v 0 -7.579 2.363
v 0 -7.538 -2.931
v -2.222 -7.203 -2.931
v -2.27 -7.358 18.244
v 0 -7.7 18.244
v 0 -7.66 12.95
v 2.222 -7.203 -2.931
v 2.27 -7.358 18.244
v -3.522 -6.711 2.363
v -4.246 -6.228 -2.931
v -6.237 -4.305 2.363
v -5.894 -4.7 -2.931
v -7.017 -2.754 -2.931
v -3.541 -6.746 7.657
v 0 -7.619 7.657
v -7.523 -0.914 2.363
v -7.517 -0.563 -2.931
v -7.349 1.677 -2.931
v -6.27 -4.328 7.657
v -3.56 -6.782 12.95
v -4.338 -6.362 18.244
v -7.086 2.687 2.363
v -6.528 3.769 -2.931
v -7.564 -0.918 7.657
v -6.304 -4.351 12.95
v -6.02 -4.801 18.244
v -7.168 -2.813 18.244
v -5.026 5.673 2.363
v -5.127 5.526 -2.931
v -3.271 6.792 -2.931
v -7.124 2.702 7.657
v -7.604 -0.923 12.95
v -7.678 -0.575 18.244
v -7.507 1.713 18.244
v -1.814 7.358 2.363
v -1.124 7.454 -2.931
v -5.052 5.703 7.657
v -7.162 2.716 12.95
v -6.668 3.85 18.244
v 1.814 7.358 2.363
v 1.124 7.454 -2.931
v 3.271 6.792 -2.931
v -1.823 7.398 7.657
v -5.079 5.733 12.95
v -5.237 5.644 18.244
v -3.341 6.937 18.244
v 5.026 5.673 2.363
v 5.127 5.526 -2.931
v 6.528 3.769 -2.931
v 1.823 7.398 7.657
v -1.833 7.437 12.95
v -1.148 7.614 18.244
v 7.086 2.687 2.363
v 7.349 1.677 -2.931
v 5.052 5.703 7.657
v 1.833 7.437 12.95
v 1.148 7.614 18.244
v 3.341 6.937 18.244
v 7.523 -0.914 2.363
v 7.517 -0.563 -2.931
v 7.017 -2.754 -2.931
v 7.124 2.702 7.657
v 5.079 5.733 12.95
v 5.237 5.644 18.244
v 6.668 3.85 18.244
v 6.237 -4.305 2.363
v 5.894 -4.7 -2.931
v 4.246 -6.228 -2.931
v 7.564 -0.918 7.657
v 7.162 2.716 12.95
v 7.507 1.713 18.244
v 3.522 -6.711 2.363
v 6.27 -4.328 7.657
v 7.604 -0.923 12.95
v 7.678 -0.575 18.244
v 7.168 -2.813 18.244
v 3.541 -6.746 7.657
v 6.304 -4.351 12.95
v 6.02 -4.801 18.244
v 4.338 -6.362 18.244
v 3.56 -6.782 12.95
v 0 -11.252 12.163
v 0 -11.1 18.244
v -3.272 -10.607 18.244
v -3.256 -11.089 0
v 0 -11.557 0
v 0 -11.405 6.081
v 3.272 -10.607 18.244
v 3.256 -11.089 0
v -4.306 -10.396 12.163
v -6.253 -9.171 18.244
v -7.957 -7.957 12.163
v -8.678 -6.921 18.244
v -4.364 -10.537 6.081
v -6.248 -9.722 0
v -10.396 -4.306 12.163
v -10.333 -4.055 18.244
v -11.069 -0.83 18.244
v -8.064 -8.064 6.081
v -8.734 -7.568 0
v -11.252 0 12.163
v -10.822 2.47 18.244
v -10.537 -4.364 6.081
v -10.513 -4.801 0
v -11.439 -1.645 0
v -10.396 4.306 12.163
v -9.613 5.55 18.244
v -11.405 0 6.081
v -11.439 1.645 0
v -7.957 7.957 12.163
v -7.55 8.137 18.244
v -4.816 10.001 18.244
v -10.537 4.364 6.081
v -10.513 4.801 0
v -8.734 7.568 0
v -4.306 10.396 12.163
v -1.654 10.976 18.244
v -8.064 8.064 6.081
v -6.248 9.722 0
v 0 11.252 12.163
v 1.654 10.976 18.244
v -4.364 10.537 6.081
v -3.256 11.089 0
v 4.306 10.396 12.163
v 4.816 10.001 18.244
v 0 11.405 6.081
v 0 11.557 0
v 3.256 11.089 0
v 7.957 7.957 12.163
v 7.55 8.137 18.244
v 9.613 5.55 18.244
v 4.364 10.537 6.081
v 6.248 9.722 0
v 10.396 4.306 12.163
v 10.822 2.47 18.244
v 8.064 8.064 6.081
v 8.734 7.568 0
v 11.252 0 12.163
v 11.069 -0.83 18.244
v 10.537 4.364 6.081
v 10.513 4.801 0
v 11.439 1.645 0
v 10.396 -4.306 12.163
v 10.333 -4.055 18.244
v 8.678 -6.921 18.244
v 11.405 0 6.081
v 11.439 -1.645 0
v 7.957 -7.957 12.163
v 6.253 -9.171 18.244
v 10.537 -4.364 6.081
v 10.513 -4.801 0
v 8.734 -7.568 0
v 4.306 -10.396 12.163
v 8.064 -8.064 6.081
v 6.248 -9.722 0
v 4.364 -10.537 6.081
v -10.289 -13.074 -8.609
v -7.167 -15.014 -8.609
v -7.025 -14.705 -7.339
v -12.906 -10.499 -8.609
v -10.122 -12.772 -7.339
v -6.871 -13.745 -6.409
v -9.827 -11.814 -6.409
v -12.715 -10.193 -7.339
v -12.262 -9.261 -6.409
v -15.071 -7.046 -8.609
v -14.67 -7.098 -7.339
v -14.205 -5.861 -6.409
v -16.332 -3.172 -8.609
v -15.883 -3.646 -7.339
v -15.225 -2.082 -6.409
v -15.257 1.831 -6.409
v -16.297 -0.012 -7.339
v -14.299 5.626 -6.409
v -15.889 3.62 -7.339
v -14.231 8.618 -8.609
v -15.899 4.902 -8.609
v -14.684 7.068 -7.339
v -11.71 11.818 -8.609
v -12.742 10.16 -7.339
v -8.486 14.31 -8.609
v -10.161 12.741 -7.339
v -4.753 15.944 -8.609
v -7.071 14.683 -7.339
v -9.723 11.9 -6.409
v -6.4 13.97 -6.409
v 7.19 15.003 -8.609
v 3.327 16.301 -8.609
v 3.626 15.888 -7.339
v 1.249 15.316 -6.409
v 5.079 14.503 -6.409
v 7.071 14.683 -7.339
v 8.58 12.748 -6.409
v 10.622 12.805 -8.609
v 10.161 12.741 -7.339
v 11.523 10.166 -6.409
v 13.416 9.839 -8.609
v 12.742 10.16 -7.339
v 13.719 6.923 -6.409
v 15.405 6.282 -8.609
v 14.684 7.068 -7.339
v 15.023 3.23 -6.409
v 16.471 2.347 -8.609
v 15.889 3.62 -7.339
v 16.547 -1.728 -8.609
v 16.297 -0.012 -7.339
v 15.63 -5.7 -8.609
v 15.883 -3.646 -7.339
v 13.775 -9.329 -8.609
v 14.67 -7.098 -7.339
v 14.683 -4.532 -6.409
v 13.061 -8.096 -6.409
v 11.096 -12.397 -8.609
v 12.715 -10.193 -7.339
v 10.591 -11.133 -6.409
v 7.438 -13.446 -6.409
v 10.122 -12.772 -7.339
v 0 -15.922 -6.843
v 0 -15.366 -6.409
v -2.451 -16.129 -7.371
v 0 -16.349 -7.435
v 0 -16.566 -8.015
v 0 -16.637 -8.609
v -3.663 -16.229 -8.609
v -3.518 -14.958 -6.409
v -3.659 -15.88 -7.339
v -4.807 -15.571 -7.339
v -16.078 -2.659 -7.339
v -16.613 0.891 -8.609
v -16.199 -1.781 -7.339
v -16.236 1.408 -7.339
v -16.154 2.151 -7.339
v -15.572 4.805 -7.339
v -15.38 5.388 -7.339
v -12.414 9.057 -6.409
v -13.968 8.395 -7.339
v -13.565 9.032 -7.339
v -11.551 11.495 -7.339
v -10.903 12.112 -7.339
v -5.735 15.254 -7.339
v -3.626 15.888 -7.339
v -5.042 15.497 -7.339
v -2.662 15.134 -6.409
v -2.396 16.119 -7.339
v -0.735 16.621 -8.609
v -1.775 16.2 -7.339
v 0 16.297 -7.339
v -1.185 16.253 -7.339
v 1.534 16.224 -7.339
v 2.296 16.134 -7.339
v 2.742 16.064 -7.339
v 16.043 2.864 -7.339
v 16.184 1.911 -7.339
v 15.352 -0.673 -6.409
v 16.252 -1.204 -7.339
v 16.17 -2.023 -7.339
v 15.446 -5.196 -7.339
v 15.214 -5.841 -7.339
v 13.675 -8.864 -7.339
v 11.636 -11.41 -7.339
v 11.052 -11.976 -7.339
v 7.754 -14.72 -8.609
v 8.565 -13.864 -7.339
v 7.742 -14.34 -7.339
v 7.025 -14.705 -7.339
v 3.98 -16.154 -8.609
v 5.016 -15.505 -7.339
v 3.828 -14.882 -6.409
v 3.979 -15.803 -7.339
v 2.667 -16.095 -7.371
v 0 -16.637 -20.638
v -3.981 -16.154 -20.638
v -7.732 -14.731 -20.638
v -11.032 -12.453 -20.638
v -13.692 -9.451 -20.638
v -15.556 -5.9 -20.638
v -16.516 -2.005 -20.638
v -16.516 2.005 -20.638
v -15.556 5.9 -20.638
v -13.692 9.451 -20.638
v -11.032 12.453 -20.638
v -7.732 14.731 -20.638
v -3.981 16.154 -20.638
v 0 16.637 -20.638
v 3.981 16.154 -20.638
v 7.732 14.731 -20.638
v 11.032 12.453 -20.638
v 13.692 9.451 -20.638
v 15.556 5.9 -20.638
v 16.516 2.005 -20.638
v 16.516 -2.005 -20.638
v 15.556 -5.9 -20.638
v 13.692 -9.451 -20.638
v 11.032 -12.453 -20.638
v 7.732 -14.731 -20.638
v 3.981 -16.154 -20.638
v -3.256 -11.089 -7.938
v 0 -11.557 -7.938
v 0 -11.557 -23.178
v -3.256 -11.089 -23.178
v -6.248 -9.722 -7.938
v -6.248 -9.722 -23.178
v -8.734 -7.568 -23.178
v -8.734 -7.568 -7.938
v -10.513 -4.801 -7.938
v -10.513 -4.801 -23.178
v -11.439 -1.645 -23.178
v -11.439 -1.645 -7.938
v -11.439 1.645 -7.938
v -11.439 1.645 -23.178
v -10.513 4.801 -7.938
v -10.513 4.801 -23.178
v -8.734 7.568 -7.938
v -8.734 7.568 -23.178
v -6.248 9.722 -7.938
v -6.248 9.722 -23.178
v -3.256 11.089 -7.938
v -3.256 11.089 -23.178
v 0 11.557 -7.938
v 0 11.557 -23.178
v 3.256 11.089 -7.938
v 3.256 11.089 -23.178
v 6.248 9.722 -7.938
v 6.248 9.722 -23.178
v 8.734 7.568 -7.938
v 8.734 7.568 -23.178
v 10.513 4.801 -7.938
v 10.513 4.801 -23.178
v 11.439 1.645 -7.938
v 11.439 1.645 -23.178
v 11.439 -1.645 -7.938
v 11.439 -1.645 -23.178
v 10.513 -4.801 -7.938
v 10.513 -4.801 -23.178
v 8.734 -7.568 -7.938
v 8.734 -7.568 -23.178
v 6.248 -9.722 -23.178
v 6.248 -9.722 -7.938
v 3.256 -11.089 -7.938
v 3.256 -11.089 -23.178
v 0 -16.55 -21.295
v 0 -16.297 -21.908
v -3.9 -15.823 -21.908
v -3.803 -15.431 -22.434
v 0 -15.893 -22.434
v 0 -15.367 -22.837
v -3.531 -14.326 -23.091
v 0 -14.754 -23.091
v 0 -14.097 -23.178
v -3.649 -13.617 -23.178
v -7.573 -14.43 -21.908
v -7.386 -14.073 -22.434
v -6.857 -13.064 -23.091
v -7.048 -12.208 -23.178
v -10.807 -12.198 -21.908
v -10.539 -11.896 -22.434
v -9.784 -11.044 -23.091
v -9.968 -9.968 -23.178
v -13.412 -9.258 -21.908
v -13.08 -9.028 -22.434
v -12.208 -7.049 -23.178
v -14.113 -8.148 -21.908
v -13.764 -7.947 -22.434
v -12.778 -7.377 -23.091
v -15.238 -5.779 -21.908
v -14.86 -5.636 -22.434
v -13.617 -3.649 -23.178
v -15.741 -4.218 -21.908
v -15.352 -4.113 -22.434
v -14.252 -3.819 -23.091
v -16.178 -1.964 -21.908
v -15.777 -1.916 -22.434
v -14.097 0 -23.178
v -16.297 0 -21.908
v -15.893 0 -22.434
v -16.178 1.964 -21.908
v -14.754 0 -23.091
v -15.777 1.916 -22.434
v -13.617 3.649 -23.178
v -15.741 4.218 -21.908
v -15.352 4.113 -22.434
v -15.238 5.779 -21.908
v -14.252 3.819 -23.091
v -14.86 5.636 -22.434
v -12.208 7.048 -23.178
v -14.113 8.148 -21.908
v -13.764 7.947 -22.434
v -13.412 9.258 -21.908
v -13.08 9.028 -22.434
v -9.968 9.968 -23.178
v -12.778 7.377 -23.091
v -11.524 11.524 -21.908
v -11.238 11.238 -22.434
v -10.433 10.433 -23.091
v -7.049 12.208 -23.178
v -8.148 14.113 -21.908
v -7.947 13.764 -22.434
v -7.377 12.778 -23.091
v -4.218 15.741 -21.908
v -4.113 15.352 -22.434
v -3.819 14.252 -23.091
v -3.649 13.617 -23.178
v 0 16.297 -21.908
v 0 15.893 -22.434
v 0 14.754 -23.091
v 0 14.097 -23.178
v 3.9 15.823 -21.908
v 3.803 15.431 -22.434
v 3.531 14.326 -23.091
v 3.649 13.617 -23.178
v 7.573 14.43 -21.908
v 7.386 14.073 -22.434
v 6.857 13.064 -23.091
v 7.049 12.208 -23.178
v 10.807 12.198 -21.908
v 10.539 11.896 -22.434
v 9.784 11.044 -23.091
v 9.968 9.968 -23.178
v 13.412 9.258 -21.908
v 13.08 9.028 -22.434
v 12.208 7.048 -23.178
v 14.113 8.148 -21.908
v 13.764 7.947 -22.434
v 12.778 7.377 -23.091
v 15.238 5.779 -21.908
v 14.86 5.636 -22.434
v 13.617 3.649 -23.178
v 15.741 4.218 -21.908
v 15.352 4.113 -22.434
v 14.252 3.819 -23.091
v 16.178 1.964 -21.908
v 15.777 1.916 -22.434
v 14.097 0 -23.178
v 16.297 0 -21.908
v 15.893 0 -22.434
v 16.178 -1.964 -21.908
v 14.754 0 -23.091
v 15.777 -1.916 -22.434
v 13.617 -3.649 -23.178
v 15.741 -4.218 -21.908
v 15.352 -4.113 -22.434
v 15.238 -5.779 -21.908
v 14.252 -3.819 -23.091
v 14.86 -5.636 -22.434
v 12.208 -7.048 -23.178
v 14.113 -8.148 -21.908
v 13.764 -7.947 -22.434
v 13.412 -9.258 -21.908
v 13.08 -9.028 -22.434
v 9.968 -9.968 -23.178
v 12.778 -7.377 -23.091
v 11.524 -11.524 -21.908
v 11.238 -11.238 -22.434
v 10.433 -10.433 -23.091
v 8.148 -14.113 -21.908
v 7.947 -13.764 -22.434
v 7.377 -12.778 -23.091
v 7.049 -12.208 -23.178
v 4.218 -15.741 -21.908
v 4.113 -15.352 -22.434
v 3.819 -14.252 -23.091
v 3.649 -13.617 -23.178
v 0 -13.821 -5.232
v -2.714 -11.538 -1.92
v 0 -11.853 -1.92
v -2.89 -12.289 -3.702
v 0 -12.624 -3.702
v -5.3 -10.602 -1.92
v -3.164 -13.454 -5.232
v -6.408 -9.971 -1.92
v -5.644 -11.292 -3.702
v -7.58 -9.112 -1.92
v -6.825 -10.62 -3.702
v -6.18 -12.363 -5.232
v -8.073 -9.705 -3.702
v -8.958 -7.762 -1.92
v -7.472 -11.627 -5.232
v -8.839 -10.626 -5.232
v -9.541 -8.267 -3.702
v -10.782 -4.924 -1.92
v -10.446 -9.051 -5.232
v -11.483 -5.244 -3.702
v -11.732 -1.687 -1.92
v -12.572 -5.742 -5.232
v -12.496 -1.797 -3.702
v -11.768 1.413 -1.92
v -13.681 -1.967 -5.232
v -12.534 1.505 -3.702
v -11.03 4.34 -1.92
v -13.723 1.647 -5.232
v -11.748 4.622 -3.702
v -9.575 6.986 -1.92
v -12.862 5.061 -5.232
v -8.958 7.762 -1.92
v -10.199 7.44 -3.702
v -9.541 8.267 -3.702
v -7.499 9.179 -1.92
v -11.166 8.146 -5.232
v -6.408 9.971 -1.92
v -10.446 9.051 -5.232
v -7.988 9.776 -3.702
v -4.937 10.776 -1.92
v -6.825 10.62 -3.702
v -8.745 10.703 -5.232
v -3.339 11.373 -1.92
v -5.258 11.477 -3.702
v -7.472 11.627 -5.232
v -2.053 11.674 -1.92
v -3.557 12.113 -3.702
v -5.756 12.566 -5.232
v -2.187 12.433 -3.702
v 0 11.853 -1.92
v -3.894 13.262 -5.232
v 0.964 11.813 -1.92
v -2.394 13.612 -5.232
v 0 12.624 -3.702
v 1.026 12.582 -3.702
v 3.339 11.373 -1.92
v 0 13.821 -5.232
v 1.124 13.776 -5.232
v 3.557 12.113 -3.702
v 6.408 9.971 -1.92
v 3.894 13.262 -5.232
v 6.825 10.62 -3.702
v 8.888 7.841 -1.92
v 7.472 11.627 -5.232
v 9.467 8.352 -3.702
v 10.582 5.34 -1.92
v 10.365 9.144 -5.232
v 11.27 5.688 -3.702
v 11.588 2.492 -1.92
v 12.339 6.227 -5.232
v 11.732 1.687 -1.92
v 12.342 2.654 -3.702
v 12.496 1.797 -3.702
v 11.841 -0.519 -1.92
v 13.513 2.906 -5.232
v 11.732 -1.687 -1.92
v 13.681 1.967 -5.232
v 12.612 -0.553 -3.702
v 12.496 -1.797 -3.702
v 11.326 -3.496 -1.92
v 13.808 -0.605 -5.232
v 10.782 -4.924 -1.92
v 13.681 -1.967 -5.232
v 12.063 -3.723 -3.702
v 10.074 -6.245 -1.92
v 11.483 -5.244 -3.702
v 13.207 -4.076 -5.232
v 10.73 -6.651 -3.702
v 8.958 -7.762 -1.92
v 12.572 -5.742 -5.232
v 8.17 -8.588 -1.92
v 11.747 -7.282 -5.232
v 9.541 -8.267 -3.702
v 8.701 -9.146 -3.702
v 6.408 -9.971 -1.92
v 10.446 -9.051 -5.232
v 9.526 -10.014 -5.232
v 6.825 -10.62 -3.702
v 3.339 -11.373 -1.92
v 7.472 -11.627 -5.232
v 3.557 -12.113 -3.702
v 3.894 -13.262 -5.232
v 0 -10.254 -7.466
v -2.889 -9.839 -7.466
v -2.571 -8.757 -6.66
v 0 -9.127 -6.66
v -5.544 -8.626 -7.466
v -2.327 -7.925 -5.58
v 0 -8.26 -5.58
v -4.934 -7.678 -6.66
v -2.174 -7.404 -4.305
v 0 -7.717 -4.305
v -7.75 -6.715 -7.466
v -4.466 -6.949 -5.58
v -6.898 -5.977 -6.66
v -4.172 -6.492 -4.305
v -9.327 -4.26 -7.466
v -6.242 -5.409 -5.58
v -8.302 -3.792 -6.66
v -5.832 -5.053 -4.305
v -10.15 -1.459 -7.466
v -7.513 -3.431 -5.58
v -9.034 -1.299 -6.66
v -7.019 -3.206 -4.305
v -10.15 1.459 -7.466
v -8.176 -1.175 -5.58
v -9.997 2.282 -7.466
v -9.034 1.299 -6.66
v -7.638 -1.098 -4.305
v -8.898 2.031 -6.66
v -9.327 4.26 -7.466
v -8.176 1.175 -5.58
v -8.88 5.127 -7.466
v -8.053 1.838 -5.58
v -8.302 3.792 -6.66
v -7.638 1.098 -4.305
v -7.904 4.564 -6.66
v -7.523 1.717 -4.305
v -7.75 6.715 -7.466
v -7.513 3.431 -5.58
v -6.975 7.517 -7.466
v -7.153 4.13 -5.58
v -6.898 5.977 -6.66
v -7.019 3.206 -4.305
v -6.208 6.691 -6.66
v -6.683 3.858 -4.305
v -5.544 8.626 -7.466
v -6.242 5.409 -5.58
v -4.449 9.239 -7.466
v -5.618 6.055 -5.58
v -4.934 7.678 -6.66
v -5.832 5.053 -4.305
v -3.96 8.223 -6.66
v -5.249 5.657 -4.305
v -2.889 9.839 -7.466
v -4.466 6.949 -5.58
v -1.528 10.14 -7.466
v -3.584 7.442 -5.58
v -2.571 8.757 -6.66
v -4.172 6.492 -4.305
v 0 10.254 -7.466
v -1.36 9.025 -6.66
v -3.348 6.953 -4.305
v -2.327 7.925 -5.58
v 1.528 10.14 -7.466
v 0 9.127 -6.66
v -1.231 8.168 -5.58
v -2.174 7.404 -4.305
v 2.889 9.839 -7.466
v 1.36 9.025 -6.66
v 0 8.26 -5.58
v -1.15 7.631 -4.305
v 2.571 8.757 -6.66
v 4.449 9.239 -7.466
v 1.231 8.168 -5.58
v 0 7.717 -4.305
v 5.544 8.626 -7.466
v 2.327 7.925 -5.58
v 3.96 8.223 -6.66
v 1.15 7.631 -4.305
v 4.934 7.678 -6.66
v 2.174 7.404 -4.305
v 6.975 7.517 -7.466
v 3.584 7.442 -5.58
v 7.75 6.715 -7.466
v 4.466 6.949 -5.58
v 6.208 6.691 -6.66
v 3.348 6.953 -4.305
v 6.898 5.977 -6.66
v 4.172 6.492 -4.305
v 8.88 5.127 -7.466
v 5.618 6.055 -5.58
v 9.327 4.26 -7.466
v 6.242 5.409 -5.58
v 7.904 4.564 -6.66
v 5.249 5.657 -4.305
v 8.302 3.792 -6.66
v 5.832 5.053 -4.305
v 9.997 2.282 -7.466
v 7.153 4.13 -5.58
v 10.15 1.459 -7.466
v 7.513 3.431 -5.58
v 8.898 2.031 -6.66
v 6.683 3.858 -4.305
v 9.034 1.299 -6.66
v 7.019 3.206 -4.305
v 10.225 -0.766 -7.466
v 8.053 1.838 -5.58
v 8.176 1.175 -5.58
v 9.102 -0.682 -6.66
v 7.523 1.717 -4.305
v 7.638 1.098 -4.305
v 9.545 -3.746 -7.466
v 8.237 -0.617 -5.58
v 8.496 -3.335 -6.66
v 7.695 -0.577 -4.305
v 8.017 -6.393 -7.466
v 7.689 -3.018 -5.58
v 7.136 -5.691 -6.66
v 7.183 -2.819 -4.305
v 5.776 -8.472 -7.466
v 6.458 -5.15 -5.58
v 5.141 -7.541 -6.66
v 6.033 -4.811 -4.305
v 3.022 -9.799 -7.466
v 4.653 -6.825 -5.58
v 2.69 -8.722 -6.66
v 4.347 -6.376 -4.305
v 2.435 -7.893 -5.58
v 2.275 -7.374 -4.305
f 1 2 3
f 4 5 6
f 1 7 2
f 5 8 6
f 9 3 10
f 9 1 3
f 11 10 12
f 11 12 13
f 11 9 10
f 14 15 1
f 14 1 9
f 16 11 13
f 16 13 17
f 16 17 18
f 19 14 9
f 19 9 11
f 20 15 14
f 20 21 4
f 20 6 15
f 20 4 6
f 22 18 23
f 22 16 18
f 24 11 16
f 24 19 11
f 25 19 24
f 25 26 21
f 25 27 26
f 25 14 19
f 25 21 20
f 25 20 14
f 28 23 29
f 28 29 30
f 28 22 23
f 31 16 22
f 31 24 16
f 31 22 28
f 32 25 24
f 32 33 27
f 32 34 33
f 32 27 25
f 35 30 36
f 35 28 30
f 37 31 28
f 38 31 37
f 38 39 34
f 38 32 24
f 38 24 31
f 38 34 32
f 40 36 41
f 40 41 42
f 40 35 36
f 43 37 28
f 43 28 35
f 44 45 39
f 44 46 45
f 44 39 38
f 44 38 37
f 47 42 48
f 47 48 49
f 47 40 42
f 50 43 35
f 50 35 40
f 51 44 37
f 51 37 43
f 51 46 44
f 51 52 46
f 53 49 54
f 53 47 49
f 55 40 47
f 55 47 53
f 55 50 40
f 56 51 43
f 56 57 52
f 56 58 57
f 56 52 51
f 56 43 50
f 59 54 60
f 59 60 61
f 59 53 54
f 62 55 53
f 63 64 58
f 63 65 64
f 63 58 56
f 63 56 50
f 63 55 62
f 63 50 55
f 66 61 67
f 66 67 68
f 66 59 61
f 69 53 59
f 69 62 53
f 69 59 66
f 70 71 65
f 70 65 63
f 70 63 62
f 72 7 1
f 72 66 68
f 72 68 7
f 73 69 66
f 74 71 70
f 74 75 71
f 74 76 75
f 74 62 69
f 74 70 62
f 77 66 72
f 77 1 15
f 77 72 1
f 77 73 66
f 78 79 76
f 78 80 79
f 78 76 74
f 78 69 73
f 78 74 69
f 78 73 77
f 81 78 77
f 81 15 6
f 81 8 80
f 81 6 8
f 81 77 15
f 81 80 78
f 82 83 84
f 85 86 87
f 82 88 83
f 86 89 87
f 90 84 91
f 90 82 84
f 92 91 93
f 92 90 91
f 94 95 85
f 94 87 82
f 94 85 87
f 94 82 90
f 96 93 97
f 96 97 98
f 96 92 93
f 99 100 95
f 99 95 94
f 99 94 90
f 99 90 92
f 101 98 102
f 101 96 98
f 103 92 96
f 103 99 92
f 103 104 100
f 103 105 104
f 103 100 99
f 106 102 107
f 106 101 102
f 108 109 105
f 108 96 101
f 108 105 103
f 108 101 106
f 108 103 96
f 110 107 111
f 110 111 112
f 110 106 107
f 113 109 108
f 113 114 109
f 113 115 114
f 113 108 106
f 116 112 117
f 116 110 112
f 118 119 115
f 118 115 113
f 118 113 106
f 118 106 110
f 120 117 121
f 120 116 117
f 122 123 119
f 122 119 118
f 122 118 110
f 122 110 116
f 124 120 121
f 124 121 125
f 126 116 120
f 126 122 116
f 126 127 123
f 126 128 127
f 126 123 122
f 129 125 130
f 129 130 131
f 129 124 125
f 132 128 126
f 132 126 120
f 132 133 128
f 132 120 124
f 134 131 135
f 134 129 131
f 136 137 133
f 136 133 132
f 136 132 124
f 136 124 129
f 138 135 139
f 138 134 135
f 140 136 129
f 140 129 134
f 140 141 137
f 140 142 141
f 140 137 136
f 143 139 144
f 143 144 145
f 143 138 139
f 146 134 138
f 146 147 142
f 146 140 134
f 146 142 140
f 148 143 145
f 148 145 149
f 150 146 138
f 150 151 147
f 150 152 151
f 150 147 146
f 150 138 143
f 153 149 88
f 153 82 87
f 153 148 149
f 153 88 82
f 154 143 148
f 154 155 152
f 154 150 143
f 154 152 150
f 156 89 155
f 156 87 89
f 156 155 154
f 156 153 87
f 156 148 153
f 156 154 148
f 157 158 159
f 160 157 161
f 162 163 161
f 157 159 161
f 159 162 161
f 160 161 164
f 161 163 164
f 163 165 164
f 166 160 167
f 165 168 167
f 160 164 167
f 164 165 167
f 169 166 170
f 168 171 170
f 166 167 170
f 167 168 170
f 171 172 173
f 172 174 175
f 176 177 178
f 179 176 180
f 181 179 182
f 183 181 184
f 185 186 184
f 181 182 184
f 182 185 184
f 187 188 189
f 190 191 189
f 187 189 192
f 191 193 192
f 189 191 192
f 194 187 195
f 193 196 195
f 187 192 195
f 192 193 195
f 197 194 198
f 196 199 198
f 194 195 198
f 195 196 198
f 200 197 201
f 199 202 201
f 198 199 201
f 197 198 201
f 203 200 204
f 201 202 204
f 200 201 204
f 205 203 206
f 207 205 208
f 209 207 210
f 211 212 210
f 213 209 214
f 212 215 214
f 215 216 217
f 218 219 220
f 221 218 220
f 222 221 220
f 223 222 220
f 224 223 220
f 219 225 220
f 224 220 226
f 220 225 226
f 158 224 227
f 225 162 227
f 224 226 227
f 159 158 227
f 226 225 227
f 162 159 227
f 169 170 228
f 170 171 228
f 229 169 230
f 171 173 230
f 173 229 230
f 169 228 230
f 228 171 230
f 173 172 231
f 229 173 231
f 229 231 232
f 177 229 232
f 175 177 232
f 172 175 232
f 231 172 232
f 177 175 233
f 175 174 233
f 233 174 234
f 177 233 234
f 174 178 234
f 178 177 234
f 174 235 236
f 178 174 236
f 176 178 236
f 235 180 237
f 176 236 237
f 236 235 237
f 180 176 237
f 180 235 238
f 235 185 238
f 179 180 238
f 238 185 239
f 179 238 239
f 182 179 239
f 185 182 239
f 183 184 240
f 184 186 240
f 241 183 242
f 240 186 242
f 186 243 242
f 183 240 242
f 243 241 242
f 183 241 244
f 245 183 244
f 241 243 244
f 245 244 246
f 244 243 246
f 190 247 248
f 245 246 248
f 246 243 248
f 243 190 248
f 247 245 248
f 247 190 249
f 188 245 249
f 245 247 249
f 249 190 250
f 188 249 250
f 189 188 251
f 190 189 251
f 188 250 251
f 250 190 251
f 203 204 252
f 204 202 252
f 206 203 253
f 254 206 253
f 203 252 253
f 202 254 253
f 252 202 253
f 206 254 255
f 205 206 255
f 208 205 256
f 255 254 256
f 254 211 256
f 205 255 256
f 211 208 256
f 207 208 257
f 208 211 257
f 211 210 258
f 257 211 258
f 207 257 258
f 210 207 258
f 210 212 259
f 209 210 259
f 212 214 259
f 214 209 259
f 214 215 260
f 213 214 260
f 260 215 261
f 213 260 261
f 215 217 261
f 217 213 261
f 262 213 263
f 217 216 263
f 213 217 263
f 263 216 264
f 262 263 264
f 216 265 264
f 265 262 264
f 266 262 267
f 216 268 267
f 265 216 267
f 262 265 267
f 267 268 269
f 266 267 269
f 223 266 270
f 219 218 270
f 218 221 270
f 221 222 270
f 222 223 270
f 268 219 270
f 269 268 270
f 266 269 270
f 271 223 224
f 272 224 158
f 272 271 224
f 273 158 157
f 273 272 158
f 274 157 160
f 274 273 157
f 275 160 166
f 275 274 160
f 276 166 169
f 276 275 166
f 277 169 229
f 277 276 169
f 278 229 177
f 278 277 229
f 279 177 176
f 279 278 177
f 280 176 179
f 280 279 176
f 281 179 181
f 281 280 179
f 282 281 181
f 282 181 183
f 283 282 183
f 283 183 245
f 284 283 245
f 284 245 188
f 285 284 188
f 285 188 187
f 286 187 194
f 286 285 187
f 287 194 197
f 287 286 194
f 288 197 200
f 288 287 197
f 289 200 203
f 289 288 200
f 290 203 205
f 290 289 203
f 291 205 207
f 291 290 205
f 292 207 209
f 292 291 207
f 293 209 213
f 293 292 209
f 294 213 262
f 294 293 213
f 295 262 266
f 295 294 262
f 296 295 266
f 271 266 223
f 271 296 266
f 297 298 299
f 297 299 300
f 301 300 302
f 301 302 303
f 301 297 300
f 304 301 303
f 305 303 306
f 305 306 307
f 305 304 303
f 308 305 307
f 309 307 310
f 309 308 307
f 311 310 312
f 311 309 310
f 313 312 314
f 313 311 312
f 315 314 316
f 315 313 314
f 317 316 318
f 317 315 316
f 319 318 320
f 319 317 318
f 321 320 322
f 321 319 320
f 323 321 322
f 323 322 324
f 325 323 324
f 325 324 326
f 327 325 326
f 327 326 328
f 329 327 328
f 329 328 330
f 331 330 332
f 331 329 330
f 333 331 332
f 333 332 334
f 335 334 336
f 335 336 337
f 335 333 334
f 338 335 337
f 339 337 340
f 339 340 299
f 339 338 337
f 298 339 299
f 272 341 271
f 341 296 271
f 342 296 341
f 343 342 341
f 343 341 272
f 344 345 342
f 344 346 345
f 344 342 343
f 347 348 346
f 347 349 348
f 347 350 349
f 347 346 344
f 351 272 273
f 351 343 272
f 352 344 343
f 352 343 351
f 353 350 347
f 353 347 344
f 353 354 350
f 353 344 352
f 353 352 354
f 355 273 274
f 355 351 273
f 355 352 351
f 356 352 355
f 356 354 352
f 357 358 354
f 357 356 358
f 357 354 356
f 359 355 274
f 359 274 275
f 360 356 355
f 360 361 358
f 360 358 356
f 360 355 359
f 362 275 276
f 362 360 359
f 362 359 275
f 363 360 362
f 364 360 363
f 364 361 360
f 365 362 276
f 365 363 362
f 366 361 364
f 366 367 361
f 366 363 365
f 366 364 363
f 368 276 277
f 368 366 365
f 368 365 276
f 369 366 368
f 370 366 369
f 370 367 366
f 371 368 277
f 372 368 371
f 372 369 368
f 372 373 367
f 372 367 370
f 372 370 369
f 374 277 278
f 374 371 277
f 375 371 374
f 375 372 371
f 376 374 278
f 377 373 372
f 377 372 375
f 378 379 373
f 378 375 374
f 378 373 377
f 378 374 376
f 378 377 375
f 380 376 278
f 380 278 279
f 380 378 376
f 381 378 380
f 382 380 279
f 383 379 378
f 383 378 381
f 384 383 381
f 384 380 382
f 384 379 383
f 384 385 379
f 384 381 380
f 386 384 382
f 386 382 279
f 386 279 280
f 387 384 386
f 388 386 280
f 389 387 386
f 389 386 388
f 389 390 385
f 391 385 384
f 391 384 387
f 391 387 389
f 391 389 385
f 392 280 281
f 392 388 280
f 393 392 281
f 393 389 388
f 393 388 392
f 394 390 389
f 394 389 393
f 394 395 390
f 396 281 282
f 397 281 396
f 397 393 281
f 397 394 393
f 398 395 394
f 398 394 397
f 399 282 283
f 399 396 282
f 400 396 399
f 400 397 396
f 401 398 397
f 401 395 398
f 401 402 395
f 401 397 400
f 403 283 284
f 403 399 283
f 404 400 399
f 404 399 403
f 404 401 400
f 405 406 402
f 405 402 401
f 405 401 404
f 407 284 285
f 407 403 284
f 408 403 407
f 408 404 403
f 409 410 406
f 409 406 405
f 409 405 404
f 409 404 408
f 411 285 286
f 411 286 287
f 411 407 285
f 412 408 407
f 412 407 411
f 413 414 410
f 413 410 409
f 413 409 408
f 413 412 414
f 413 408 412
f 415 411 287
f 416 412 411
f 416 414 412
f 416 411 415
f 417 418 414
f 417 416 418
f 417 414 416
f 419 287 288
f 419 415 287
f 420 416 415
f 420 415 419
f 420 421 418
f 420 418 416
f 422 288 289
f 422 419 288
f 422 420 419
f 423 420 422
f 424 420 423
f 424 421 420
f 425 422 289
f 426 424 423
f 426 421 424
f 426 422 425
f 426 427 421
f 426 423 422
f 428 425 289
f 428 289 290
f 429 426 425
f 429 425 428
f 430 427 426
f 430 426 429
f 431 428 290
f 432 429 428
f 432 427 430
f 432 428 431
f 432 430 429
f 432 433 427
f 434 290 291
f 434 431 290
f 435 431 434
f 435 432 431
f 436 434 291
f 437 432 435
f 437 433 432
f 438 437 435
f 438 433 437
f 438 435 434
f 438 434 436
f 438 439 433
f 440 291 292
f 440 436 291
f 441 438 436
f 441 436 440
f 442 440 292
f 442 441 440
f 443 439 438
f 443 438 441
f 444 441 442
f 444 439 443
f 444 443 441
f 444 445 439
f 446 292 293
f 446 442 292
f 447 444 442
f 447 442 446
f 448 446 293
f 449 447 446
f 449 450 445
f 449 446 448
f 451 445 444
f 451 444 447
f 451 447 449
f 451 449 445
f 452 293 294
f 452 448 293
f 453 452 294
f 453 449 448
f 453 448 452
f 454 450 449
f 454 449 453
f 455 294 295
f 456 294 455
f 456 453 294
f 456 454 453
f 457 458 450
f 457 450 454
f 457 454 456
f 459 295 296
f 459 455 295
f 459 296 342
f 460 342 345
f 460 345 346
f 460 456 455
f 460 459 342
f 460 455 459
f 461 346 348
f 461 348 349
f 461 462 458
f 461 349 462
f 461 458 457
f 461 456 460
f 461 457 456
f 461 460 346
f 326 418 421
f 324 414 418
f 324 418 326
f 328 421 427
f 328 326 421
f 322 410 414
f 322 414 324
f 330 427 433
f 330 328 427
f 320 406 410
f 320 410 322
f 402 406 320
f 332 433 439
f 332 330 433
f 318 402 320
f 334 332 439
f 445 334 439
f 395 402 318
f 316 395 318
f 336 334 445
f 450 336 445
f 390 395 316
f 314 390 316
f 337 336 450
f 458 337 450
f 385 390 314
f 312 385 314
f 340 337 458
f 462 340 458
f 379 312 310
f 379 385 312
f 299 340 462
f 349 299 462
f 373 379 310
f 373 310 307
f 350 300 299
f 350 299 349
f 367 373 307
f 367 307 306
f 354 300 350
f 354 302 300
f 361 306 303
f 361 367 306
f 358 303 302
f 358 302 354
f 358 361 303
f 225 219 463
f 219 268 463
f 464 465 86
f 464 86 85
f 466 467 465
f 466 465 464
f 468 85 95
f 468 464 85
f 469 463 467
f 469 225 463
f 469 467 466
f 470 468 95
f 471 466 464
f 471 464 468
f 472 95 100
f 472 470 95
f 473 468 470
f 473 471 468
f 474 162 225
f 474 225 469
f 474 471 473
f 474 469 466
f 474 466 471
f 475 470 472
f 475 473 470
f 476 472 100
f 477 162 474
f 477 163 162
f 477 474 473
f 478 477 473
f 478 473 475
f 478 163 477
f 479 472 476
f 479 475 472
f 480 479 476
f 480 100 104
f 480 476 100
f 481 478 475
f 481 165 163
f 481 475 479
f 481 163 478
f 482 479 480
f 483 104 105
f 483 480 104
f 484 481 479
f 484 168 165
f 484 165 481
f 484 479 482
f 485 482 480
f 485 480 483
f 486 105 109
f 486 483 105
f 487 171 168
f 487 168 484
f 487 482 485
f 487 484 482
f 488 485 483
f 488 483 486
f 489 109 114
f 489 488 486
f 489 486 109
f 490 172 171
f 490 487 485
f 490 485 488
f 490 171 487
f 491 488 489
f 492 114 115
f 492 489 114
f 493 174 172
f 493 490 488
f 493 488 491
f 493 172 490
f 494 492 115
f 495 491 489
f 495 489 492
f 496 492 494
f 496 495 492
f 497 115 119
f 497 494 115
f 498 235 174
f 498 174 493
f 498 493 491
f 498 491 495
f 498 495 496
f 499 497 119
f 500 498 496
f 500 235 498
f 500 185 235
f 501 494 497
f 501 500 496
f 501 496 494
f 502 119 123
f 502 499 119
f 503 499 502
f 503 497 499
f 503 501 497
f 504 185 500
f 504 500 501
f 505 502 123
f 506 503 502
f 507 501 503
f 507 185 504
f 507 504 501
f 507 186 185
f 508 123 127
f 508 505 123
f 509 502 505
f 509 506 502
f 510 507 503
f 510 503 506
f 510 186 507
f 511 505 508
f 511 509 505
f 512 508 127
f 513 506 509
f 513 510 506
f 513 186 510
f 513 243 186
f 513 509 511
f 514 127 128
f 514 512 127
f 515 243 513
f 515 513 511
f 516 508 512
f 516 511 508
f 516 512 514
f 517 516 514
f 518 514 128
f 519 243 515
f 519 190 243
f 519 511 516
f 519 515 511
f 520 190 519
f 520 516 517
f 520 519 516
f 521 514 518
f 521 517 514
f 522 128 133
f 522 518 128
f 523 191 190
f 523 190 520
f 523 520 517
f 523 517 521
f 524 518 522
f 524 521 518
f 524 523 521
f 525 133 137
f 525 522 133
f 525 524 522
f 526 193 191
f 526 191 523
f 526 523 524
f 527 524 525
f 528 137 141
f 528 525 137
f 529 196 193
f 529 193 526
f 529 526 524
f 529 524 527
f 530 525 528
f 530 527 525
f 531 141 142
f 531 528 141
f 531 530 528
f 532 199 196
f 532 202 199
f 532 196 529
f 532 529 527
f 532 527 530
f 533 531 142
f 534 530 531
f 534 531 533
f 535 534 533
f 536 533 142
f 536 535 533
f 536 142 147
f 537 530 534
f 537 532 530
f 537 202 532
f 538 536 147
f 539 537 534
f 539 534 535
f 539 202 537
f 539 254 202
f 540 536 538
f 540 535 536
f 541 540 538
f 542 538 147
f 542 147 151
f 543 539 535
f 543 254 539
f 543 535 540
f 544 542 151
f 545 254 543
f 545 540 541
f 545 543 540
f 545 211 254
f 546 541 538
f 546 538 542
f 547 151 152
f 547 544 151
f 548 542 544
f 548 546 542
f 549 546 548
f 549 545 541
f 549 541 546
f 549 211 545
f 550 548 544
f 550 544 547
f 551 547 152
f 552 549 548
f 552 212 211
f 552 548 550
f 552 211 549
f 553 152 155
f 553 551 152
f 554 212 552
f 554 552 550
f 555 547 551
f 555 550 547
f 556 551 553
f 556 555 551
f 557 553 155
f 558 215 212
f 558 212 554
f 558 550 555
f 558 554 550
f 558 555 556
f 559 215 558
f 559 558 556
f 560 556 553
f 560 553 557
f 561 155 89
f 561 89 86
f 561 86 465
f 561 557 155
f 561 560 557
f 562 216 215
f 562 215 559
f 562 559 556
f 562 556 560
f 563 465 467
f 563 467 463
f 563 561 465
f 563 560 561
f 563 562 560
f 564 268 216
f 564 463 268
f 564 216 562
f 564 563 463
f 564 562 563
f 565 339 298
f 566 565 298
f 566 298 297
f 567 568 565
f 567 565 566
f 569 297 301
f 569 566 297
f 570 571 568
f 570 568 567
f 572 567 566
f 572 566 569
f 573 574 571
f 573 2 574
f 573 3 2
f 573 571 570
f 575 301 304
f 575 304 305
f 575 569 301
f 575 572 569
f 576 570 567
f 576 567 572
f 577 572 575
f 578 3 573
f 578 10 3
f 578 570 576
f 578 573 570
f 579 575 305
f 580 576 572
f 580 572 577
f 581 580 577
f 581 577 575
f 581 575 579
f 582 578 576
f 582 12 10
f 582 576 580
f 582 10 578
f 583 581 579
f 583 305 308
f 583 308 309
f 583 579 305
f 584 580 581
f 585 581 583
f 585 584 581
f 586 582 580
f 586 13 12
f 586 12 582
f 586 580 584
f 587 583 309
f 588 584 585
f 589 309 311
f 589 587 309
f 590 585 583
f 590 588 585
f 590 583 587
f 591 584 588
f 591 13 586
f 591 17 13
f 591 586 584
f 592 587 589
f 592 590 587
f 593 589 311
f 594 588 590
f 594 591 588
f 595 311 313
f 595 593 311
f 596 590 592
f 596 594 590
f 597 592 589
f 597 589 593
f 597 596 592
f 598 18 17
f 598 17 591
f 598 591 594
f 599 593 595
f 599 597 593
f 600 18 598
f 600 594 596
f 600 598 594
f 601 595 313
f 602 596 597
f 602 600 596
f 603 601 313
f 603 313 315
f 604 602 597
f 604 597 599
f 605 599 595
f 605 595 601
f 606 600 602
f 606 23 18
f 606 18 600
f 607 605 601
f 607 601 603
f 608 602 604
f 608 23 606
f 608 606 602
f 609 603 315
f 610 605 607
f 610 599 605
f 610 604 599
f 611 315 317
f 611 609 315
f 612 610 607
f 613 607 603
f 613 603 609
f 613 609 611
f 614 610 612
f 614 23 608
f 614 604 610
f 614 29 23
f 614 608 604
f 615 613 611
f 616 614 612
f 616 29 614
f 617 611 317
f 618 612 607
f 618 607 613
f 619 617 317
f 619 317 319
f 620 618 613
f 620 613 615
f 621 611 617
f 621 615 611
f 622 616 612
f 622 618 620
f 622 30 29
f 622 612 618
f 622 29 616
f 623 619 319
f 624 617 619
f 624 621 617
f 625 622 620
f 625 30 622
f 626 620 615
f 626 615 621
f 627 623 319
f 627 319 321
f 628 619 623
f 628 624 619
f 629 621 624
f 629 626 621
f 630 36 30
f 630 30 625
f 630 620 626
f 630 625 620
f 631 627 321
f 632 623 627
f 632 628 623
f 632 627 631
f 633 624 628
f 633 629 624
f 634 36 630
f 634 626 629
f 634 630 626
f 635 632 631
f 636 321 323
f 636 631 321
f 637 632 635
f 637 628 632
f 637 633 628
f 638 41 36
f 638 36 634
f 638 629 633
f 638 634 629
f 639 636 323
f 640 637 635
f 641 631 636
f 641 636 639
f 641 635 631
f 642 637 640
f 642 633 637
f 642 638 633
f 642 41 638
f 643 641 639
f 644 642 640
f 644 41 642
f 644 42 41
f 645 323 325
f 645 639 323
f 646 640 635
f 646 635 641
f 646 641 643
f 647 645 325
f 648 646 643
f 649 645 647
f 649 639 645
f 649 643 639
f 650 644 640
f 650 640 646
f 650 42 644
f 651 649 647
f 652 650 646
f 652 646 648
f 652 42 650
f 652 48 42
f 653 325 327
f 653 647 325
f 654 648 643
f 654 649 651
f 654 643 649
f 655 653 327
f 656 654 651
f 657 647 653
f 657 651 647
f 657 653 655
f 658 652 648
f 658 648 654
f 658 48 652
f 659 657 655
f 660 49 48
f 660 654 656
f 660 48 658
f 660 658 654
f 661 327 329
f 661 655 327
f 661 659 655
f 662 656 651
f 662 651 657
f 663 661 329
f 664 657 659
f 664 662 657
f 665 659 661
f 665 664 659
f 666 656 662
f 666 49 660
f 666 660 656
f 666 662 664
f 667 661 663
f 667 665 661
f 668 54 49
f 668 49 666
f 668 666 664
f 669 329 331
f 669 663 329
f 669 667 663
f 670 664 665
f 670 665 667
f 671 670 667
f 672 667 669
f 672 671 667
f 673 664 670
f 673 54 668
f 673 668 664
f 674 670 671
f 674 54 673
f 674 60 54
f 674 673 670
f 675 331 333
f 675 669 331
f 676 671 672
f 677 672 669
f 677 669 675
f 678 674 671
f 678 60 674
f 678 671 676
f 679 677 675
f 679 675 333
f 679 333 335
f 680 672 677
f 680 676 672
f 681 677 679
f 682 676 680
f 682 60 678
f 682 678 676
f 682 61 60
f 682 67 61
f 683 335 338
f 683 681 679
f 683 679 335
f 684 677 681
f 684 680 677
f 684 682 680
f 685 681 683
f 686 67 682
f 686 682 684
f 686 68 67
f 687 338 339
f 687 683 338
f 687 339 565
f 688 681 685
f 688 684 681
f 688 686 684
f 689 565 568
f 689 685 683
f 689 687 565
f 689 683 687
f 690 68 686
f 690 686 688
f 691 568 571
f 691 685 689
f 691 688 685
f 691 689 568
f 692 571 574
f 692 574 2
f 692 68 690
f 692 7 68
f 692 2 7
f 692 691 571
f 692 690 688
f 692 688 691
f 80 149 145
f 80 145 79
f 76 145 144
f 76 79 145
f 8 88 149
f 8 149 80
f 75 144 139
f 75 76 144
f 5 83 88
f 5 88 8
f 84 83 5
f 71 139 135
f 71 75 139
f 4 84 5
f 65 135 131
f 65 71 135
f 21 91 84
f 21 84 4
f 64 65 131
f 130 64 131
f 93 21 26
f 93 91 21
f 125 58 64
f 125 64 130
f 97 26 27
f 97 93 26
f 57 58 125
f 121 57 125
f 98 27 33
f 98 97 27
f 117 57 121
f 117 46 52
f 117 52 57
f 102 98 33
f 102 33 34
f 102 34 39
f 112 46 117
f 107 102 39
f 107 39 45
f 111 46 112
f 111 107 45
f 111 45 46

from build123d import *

# Parameters (mm, degrees)
FILLET1_R = 5.08
FILLET2_R = 2.54


with BuildPart() as part:
    # Sketch1 → Revolve1 (revolve)
    with BuildSketch(Plane(origin=(0, 0, 0), x_dir=(0, 0, -1), z_dir=(1, 0, 0)), mode=Mode.PRIVATE) as revolve1_sk:
        with BuildLine():
            Line((-18.244148936, 11.1), (0, 11.557))
            ThreePointArc((0, 11.557), (4.287180767, 13.00922662), (6.994234772, 16.637))
            Line((6.994234772, 16.637), (23.177729058, 16.637))
            Line((23.177729058, 16.637), (23.177729058, 11.557))
            Line((23.177729058, 11.557), (7.937729058, 11.557))
            Line((7.937729058, 11.557), (7.937729058, 7.5))
            Line((7.937729058, 7.5), (-18.244148936, 7.7))
            Line((-18.244148936, 7.7), (-18.244148936, 11.1))
        make_face()
    revolve(revolve1_sk.sketch.rotate(Axis((0, 0, 18.244148936), (0, 0, -1)), 180), axis=Axis((0, 0, 18.244148936), (0, 0, -1)))

    # Fillet1
    # the kernel refuses this fillet: 5.08 mm, written as the material it takes off along each edge
    with BuildSketch(Plane(origin=(0, 0, -7.937729058), x_dir=(0, -1, 0), z_dir=(1, 0, 0))) as fillet1_piece_1:
        with BuildLine():
            CenterArc((12.618097701, -4.967944411), FILLET1_R, 102.056579011, 78.38108757)
            Line((7.53824591, -5.006748745), (7.436648874, -5.007524832))
            Line((7.436648874, -5.007524832), (7.398402964, -0.000776087))
            Line((7.398402964, -0.000776087), (7.5, 0.1016))
            ThreePointArc((7.5, 0.1016), (9.5285, 0.1016), (11.535778046, 0.099358888))
            Line((11.535778046, 0.099358888), (11.557, 0))
        make_face()
    revolve(axis=Axis((0, 0, -7.937729058), (0, 0, -1)), mode=Mode.SUBTRACT)

    # Fillet2
    fillet2_edges = [part.edges().sort_by_distance(p)[0] for p in [
        (0, 16.637, -23.177729058),
        (0, 16.637, -6.994234772),
    ]]
    fillet(fillet2_edges, radius=FILLET2_R)


solid = part.part
